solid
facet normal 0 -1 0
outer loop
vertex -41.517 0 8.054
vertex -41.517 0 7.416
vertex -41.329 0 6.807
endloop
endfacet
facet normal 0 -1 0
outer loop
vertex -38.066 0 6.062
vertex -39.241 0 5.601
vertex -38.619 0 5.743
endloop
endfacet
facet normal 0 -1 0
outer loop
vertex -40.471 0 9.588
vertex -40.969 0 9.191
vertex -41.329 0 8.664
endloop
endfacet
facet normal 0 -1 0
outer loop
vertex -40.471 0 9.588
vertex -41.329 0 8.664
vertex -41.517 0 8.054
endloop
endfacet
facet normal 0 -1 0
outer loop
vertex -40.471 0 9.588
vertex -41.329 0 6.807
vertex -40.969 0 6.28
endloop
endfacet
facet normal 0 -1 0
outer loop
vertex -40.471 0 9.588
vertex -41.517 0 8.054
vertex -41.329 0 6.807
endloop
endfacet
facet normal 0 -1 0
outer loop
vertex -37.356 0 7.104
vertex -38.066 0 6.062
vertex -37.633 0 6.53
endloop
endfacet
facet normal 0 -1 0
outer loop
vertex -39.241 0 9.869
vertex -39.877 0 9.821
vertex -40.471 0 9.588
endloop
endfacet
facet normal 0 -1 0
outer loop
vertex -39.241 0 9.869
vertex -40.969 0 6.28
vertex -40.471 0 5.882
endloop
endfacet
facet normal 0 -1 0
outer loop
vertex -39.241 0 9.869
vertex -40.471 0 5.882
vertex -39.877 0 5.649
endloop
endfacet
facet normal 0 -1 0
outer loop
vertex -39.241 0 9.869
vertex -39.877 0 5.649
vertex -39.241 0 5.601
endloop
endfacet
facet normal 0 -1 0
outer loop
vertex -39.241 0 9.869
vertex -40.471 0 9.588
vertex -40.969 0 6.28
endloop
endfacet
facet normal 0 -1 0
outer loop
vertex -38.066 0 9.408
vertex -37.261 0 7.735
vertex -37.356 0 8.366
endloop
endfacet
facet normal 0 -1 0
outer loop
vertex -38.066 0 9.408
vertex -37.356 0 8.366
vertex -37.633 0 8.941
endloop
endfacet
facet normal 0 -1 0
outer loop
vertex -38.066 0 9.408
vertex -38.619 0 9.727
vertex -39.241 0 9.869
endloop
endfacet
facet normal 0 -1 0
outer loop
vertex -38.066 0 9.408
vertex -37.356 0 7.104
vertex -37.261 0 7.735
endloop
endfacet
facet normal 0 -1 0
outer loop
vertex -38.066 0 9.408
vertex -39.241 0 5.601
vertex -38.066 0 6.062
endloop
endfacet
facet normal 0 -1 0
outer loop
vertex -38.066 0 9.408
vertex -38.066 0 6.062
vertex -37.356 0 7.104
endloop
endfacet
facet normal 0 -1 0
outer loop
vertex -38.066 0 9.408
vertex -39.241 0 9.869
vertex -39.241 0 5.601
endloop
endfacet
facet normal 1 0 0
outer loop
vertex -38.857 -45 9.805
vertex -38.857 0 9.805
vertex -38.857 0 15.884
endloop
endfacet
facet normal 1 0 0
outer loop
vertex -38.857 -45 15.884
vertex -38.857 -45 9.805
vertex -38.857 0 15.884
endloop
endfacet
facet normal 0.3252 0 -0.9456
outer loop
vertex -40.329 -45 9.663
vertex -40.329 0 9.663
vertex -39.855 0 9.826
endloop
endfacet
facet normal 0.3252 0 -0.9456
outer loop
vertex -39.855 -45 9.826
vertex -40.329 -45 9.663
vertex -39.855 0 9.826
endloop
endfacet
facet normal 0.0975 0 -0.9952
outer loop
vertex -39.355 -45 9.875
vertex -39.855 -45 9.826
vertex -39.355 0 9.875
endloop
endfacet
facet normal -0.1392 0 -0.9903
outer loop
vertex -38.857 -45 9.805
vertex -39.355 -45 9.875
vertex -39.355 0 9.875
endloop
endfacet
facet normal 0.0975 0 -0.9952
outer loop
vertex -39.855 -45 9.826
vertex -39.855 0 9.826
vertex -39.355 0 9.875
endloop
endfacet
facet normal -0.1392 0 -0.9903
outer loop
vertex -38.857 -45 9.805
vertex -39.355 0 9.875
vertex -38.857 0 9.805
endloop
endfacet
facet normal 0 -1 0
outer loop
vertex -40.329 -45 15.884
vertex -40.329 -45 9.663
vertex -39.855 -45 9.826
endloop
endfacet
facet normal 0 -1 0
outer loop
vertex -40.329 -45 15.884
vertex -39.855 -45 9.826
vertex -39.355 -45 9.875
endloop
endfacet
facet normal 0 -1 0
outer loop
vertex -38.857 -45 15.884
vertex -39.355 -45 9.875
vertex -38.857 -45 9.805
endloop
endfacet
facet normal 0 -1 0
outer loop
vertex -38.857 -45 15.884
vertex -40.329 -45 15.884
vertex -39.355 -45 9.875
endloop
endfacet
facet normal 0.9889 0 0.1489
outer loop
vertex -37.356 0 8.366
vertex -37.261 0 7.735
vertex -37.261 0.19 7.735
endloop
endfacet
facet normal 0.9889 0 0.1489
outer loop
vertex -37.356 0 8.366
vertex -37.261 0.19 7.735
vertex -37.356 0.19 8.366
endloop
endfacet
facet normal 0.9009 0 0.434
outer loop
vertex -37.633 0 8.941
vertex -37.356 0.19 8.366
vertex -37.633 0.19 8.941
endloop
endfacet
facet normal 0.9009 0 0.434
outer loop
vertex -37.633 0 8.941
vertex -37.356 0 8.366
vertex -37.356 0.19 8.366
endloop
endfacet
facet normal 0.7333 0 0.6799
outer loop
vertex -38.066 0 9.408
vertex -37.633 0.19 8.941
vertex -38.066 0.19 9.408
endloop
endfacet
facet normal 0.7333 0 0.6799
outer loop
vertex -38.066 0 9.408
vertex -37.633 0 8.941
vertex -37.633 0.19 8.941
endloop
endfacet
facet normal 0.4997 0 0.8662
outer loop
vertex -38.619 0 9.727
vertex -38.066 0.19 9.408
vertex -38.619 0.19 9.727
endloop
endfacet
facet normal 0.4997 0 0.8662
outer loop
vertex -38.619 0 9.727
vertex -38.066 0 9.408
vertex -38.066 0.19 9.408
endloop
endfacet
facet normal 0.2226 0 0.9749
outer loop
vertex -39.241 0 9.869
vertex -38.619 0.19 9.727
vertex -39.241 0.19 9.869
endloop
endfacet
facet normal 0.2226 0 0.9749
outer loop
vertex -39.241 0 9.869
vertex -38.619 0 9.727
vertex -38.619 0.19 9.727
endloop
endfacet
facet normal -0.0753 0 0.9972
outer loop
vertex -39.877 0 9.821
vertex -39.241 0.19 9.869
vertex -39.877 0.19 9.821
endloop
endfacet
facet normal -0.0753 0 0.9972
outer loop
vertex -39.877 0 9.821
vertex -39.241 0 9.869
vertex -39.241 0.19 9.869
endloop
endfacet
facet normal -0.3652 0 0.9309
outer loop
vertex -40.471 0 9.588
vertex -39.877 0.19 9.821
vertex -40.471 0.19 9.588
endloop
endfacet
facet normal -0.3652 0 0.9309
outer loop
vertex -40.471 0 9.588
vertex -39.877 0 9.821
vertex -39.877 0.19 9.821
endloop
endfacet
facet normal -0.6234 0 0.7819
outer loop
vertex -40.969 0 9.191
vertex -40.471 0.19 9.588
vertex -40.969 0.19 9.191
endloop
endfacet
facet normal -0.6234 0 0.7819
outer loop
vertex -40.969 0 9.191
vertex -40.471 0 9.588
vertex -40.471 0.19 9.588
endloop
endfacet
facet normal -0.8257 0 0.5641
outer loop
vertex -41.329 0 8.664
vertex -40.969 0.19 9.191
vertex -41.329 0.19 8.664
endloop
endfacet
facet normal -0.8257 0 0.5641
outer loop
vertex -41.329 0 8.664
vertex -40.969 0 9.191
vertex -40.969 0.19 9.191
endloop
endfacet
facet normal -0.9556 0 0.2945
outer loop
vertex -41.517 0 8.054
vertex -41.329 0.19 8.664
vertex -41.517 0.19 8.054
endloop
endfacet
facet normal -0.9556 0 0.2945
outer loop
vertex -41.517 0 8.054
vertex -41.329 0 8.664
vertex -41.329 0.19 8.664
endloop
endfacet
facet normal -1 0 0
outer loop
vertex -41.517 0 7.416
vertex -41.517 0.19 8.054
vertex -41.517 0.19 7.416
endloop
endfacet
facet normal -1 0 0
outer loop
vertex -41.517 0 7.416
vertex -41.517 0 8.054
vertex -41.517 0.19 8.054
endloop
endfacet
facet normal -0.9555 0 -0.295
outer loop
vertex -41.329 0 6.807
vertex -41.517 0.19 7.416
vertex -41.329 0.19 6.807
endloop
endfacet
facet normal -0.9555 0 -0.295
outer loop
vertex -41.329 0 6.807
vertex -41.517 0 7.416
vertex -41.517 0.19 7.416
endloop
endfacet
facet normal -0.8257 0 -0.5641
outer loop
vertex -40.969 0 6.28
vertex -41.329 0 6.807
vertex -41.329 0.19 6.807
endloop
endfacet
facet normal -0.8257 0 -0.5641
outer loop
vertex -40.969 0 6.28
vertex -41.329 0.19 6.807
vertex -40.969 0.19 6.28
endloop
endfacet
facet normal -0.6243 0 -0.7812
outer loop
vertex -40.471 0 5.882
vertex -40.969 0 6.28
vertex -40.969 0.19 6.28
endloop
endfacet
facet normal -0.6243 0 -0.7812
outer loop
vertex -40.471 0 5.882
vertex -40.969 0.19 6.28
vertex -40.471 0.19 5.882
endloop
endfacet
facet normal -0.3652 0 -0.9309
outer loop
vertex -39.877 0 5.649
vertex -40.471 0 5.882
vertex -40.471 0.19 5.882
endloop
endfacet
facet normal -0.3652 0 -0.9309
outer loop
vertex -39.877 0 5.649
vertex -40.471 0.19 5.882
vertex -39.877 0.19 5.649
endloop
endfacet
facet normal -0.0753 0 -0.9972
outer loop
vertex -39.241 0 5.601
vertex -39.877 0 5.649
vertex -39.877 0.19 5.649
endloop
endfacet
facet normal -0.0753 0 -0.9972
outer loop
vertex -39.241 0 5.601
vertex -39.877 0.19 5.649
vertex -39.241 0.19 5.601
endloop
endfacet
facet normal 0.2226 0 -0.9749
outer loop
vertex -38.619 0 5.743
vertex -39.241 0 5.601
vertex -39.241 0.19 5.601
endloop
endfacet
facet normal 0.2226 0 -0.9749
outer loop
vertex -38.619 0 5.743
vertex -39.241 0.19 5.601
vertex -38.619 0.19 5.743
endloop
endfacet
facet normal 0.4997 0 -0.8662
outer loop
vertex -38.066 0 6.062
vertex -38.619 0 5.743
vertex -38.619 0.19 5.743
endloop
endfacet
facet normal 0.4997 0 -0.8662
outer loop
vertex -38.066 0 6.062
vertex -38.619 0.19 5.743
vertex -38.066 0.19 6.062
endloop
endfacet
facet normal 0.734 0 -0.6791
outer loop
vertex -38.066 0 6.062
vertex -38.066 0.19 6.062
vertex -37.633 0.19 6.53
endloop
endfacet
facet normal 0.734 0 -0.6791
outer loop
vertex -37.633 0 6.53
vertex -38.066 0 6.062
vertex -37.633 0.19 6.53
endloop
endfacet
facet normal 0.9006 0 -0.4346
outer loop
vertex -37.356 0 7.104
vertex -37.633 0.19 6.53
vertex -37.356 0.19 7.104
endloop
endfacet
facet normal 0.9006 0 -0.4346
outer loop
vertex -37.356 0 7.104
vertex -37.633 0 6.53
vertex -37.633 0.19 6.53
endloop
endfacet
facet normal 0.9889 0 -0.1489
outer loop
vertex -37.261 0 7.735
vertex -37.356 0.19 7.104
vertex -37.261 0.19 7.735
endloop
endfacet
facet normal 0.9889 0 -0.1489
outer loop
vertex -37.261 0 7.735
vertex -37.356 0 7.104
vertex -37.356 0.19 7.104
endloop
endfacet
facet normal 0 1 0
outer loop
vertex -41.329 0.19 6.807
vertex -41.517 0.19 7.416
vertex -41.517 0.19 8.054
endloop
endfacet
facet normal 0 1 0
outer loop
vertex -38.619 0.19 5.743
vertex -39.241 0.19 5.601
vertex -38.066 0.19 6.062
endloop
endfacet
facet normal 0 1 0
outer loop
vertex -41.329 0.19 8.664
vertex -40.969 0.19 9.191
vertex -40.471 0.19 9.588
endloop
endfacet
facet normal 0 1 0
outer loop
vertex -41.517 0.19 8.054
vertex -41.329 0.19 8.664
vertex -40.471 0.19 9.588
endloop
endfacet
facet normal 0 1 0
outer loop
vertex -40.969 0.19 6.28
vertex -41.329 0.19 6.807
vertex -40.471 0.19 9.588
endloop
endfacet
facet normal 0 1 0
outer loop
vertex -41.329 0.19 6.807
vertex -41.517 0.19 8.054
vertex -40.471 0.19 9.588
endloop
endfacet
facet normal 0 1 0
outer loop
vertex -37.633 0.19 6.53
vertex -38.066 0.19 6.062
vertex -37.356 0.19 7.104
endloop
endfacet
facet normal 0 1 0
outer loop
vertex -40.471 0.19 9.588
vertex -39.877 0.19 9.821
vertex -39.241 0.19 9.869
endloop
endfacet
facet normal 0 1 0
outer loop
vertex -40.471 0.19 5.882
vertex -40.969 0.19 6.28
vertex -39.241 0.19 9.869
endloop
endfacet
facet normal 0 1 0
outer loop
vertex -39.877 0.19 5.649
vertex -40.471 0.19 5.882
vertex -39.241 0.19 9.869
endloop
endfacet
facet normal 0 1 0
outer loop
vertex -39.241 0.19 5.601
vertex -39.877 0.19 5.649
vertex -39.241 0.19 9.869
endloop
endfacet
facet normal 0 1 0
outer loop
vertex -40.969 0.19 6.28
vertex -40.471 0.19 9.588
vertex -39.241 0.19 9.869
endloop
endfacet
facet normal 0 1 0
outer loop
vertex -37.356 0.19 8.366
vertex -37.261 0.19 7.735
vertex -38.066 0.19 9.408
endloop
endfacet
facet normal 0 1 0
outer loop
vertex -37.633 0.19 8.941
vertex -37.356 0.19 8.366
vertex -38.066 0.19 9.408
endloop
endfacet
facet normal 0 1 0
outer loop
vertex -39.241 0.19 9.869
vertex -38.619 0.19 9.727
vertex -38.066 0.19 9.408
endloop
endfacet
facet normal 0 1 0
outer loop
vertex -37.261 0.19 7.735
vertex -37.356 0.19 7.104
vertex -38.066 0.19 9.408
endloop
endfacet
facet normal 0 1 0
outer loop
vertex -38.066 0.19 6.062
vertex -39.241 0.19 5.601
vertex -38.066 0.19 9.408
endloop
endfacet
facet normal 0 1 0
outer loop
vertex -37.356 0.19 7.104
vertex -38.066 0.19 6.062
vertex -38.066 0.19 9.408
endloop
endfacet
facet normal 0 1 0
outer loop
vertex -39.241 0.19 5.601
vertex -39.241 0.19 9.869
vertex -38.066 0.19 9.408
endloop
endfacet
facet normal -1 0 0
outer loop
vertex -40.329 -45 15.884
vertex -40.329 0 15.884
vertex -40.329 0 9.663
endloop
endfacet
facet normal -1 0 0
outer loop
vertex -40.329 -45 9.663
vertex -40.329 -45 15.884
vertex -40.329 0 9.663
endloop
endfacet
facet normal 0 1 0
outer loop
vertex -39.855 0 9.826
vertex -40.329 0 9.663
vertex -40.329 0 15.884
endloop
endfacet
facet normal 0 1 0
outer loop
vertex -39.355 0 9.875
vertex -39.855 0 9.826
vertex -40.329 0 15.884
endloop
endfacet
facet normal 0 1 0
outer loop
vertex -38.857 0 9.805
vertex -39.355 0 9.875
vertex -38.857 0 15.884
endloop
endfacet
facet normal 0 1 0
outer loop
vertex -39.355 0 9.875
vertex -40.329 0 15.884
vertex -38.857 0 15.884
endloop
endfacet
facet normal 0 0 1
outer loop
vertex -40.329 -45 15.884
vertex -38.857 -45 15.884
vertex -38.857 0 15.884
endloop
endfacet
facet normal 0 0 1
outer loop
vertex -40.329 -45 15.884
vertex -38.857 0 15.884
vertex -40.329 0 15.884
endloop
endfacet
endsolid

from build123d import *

# Parameters (mm, degrees)
F0_R     = 2.14
F0_R_2   = 0.345
F1_DEPTH = 0.19
F4_DEPTH = 45


# Not quite as in the source:
# - the program builds the solid bodies; features that only make, move or delete a surface that nothing else refers to are left out


with BuildPart() as f1:
    # F0 (on Front) → F1 (new body)
    with BuildSketch(Plane.XZ):
        with Locations((-39.4006967545, 7.7351056971)):
            Circle(F0_R)
        with Locations((-39.4006967545, 7.7351056971)):
            Circle(F0_R_2, mode=Mode.SUBTRACT)
        with Locations((-39.4006967545, 7.7351056971)):
            Circle(F0_R_2)
    extrude(amount=-F1_DEPTH)


with BuildPart() as f4:
    # F3 (on face) → F4 (new body)
    with BuildSketch(Plane.XZ):
        with BuildLine():
            Line((-40.3294656016, 15.8844348318), (-40.3294656016, 9.6630549776))
            ThreePointArc((-40.3294656016, 9.6630549776), (-39.6059801702, 9.8652368478), (-38.8571992517, 9.8049391359))
            Line((-38.8571992517, 9.8049391359), (-38.8571992517, 15.8844348318))
            Line((-38.8571992517, 15.8844348318), (-40.3294656016, 15.8844348318))
        make_face()
    extrude(amount=F4_DEPTH)


solid = Compound([f1.part, f4.part])
